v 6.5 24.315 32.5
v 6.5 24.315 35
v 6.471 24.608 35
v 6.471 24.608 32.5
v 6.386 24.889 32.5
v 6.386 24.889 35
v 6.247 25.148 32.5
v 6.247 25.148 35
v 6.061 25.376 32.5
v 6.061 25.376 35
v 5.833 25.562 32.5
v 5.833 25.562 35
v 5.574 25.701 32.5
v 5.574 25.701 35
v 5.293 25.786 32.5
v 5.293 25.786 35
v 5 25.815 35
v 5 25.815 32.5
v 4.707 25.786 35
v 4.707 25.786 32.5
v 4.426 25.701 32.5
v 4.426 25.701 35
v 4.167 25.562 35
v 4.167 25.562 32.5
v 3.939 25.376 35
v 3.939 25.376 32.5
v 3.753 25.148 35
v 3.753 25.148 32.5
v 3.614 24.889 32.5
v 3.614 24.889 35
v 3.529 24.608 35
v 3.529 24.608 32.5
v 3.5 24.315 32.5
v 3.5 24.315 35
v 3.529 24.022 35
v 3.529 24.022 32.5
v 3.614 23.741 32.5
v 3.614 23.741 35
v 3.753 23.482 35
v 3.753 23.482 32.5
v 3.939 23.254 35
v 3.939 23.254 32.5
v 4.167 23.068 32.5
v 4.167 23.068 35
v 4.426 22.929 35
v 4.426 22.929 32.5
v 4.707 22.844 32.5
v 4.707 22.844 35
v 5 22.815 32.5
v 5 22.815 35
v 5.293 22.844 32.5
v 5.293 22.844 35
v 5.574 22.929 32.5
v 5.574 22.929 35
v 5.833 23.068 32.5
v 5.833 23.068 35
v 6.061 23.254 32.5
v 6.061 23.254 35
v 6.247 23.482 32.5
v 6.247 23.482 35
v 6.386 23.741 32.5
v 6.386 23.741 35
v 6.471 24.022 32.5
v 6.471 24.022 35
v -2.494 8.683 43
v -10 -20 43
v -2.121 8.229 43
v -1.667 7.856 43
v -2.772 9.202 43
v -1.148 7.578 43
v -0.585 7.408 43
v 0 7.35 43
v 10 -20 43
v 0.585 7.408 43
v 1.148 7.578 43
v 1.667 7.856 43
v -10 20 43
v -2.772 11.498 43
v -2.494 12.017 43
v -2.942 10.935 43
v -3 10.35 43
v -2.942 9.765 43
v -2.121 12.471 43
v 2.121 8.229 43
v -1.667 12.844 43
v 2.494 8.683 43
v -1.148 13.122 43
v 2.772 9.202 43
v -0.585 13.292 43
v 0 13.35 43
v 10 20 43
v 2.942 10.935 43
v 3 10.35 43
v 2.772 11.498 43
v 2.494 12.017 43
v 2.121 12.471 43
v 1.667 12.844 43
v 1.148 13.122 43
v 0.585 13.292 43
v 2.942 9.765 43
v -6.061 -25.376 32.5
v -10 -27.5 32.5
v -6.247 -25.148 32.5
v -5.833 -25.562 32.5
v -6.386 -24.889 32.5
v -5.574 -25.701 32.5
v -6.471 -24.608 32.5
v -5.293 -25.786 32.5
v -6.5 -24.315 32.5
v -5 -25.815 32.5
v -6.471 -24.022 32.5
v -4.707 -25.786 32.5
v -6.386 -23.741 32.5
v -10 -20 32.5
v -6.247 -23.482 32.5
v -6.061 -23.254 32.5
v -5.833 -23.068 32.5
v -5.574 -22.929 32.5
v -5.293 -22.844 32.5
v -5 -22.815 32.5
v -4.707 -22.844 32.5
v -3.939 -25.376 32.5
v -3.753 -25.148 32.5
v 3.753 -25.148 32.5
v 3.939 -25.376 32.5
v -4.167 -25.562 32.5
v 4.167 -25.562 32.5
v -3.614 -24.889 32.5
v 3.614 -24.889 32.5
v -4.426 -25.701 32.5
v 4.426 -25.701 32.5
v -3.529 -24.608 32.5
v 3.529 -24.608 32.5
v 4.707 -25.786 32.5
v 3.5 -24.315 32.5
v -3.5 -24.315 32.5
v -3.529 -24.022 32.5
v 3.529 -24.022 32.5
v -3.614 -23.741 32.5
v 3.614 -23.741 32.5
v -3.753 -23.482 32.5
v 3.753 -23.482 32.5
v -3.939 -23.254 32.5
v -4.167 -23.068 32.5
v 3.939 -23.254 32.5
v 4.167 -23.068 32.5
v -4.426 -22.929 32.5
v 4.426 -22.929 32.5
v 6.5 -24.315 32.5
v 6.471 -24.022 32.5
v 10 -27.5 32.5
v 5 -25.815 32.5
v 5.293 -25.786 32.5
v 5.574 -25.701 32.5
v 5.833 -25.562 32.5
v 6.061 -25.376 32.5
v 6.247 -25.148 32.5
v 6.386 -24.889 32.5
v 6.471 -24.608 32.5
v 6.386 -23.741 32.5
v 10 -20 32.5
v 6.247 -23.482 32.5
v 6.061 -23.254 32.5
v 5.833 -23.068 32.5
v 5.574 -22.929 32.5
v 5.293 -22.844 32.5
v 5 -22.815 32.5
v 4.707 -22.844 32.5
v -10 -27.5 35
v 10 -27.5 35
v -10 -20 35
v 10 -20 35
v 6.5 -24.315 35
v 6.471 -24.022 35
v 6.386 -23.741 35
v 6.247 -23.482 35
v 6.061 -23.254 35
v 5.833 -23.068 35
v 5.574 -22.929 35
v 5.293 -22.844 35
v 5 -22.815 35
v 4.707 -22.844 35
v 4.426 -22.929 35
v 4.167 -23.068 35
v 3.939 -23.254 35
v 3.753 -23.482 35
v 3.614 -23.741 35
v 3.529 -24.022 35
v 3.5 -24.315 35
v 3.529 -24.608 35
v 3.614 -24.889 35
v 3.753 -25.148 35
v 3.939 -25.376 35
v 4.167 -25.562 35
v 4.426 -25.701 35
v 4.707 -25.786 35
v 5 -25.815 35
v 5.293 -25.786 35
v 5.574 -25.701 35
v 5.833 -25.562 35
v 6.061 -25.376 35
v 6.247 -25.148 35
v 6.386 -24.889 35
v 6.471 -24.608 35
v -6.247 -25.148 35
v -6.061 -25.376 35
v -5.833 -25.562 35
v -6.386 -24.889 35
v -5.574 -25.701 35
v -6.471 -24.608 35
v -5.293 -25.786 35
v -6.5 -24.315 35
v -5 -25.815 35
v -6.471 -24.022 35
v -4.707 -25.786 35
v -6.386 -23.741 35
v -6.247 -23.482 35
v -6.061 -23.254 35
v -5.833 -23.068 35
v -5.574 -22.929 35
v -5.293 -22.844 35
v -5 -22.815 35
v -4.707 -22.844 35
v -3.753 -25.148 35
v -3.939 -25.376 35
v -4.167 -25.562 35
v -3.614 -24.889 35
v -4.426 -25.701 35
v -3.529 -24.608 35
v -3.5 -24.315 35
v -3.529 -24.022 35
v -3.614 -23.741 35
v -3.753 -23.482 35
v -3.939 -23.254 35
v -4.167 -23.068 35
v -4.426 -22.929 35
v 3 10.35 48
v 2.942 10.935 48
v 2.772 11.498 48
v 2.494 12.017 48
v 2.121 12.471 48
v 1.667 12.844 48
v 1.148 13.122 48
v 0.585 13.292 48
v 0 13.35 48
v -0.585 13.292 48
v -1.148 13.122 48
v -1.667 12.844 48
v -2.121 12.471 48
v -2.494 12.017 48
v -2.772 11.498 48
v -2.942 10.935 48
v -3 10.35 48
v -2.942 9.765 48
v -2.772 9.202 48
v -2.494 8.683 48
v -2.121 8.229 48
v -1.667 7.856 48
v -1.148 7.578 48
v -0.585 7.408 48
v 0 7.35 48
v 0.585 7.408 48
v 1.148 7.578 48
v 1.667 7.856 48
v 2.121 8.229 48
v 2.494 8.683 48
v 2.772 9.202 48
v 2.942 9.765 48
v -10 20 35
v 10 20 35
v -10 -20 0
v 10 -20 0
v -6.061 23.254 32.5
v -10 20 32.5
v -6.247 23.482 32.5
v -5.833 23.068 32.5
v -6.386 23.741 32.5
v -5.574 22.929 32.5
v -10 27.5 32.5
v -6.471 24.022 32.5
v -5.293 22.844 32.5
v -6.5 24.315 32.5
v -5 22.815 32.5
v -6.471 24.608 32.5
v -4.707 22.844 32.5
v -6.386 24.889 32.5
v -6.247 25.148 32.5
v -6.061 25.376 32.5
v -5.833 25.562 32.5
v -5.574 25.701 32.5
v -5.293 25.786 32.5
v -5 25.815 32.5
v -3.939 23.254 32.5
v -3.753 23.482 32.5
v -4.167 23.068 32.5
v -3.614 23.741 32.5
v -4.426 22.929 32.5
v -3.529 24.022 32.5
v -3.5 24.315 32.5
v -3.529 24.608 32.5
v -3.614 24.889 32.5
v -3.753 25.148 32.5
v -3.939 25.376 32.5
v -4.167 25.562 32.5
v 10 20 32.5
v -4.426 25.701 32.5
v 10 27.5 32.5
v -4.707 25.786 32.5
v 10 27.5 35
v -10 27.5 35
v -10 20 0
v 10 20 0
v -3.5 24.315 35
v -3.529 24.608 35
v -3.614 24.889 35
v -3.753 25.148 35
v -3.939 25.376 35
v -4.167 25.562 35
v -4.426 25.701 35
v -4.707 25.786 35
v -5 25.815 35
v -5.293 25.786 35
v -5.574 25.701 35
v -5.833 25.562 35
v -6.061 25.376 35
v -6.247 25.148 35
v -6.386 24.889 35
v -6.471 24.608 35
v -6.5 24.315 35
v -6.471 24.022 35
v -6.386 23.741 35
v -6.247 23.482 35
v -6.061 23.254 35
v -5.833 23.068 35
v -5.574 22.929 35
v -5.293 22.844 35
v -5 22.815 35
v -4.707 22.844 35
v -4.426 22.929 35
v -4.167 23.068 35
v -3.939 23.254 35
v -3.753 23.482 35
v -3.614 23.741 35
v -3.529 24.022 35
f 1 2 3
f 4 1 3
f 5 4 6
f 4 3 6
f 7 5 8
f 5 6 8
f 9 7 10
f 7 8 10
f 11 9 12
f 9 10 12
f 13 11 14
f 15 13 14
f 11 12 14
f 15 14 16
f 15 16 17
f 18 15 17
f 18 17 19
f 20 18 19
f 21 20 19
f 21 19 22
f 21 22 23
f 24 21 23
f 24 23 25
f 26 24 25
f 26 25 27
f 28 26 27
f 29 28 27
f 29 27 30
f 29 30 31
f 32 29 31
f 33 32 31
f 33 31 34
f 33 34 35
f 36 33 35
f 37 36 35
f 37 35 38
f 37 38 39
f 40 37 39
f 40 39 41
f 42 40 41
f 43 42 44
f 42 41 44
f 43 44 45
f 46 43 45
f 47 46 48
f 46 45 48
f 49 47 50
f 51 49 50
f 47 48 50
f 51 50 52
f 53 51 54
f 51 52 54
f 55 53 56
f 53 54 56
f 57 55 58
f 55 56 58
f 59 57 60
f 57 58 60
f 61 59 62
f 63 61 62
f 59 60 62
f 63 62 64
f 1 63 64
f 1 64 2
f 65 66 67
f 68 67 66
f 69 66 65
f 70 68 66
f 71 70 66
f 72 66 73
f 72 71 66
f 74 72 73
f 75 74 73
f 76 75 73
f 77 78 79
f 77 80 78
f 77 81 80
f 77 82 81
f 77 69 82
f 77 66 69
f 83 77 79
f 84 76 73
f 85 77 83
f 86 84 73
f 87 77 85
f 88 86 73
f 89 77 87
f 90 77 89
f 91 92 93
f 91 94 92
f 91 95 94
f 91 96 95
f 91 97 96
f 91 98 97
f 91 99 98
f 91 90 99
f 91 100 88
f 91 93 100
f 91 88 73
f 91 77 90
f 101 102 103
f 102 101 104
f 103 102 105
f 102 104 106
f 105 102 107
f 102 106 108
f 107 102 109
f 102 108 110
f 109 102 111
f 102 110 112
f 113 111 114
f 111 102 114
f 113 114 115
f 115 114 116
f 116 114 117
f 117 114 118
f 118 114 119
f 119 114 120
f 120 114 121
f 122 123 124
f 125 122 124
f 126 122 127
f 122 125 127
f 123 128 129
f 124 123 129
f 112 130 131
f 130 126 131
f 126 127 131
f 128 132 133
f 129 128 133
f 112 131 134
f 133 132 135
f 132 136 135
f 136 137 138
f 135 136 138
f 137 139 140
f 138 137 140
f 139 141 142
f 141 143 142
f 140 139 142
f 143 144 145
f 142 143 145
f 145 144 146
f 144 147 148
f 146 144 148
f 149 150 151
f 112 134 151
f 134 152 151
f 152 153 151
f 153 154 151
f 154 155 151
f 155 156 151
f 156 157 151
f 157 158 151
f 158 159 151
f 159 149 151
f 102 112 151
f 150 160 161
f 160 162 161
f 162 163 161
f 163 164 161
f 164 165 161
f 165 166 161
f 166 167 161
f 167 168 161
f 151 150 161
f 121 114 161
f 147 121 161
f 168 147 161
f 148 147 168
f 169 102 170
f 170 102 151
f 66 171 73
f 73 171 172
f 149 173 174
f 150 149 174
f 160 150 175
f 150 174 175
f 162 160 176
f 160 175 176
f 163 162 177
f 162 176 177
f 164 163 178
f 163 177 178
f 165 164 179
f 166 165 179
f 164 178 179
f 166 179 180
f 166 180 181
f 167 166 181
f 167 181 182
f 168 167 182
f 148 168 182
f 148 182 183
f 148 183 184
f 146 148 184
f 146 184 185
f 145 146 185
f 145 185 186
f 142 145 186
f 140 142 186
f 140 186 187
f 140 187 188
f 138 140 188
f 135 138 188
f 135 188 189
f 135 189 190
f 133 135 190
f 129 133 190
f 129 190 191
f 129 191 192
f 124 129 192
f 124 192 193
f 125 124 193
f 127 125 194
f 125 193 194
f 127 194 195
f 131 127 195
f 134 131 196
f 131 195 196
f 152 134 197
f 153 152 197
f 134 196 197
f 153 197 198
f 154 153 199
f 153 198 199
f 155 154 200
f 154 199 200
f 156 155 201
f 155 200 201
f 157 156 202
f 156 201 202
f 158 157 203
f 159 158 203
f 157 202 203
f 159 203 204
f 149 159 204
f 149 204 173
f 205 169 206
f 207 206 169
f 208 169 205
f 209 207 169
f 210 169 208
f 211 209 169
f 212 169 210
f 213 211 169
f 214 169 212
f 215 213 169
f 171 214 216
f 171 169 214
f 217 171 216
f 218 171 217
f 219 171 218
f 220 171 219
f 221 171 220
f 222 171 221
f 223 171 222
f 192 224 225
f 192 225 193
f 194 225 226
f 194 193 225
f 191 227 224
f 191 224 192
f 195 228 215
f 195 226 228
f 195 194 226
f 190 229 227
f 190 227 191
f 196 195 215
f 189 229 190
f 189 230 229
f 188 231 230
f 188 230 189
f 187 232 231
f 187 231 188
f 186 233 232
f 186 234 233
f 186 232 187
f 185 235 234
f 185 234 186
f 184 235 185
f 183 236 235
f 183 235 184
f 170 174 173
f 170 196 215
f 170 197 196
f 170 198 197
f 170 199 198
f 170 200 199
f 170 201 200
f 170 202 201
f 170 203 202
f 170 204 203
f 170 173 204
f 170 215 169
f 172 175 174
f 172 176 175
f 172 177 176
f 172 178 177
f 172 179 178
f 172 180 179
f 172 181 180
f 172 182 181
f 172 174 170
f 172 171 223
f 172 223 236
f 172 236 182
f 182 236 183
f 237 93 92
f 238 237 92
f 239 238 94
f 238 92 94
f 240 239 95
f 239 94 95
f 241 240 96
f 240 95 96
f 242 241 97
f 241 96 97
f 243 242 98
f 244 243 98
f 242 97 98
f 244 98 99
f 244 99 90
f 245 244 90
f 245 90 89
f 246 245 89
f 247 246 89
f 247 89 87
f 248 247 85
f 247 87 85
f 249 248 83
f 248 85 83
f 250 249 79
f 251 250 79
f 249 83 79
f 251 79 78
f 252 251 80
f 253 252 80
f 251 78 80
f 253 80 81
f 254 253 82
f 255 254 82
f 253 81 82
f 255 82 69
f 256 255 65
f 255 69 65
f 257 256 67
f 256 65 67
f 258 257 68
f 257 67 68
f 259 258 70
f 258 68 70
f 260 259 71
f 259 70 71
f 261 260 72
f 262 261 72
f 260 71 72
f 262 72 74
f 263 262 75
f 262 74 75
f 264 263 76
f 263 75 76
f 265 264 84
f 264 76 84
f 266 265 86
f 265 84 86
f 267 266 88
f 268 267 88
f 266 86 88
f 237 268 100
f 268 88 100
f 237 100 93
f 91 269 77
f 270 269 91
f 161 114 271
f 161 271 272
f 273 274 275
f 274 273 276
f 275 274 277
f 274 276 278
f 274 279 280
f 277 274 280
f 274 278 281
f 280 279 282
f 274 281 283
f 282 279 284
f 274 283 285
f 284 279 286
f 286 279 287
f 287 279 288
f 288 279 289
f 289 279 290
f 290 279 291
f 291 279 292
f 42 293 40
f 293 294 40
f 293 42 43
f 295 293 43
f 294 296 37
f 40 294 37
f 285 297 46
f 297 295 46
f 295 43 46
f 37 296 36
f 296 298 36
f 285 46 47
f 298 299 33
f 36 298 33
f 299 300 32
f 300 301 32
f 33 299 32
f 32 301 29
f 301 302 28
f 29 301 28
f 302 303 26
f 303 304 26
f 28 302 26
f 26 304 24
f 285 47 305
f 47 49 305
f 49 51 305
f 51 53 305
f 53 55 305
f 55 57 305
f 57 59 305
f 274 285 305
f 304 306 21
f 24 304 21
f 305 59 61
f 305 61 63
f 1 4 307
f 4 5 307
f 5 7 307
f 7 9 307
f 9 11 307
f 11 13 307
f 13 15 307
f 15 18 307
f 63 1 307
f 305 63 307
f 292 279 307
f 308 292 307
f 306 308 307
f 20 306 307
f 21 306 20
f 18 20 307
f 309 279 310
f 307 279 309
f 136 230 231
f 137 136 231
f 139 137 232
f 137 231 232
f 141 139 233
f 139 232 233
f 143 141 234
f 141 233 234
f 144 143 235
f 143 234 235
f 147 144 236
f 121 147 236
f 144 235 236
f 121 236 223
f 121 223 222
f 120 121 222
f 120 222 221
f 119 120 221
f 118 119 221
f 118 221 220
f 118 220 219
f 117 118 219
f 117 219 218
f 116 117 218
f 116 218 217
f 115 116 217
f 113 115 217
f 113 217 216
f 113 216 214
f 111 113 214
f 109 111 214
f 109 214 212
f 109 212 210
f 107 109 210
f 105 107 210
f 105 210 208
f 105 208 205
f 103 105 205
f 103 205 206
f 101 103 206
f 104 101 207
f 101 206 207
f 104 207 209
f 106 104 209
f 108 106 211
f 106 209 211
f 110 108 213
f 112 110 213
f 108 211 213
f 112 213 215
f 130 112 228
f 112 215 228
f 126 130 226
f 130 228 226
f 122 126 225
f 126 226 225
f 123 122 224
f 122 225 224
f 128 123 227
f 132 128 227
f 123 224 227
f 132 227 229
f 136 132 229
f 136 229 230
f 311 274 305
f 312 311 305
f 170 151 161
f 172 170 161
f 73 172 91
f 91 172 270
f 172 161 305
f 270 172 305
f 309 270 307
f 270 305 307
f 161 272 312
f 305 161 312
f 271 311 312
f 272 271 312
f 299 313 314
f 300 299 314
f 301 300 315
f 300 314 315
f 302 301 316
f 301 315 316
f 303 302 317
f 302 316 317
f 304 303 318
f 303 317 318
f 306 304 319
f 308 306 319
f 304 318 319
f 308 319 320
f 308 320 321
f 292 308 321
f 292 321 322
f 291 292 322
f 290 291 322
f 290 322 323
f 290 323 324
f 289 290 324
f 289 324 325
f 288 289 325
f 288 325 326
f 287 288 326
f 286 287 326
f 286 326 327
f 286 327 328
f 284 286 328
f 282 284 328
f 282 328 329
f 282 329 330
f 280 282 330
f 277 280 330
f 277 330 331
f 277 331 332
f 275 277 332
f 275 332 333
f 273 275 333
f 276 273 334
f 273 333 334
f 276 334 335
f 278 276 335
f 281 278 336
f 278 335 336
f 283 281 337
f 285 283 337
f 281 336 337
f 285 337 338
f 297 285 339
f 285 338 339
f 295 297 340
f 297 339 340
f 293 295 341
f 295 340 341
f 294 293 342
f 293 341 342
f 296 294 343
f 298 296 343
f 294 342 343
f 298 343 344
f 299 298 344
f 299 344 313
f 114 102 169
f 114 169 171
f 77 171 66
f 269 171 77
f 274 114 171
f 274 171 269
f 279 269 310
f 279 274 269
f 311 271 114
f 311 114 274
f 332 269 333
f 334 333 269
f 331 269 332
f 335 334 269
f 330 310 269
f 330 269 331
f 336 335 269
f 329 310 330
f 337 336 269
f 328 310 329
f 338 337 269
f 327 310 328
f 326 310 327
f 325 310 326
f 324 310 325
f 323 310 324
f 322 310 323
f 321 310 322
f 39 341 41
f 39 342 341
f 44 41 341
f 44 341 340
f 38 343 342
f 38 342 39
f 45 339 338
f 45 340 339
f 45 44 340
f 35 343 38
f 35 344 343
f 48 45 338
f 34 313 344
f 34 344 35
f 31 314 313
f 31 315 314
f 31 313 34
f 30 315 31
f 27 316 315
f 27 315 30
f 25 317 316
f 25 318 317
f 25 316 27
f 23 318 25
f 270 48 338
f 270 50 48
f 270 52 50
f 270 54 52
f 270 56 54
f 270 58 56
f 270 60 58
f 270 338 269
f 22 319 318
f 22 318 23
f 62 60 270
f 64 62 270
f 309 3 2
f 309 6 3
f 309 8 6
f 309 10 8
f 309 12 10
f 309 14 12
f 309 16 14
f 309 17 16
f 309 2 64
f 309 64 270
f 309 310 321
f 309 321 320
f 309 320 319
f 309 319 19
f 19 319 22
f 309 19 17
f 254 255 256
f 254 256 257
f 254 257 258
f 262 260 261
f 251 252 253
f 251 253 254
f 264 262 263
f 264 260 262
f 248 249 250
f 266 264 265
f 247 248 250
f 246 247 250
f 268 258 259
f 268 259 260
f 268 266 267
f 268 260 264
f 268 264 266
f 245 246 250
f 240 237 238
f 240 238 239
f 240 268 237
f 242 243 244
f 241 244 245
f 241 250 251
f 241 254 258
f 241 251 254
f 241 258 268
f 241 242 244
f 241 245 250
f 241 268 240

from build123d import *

# Parameters (mm, degrees)
SKETCH_1_W          = 20
SKETCH_1_H          = 40
EXTRUDE_1_DEPTH     = 32.5
SKETCH_2_W          = 20
SKETCH_2_H          = 55
EXTRUDE_2_DEPTH     = 2.5
SKETCH_3_W          = 20
SKETCH_3_H          = 40
EXTRUDE_3_DEPTH     = 8
SKETCH_4_R          = 3
EXTRUDE_4_DEPTH     = 5
SKETCH_5_R          = 1.5
CUT_EXTRUDE_1_DEPTH = 36


with BuildPart() as part:
    # 草图1 → 凸台-拉伸1 (new body)
    with BuildSketch(Plane.XY):
        Rectangle(SKETCH_1_W, SKETCH_1_H)
    extrude(amount=EXTRUDE_1_DEPTH)

    # 草图2 → 凸台-拉伸2 (add)
    with BuildSketch(Plane.XY.offset(32.5)):
        Rectangle(SKETCH_2_W, SKETCH_2_H)
    extrude(amount=EXTRUDE_2_DEPTH)

    # 草图3 → 凸台-拉伸3 (add)
    with BuildSketch(Plane.XY.offset(35)):
        Rectangle(SKETCH_3_W, SKETCH_3_H)
    extrude(amount=EXTRUDE_3_DEPTH)

    # 草图4 → 凸台-拉伸4 (add)
    with BuildSketch(Plane.XY.offset(43)):
        with Locations((0, 10.35)):
            Circle(SKETCH_4_R)
    extrude(amount=EXTRUDE_4_DEPTH)

    # 草图5 → 切除-拉伸1 (cut, through all)
    with BuildSketch(Plane.XY.offset(35)):
        with Locations((-5, 24.315)):
            Circle(SKETCH_5_R)
        with Locations((5, 24.315)):
            Circle(SKETCH_5_R)
        with Locations((-5, -24.315)):
            Circle(SKETCH_5_R)
        with Locations((5, -24.315)):
            Circle(SKETCH_5_R)
    extrude(amount=-CUT_EXTRUDE_1_DEPTH, mode=Mode.SUBTRACT)


solid = part.part
